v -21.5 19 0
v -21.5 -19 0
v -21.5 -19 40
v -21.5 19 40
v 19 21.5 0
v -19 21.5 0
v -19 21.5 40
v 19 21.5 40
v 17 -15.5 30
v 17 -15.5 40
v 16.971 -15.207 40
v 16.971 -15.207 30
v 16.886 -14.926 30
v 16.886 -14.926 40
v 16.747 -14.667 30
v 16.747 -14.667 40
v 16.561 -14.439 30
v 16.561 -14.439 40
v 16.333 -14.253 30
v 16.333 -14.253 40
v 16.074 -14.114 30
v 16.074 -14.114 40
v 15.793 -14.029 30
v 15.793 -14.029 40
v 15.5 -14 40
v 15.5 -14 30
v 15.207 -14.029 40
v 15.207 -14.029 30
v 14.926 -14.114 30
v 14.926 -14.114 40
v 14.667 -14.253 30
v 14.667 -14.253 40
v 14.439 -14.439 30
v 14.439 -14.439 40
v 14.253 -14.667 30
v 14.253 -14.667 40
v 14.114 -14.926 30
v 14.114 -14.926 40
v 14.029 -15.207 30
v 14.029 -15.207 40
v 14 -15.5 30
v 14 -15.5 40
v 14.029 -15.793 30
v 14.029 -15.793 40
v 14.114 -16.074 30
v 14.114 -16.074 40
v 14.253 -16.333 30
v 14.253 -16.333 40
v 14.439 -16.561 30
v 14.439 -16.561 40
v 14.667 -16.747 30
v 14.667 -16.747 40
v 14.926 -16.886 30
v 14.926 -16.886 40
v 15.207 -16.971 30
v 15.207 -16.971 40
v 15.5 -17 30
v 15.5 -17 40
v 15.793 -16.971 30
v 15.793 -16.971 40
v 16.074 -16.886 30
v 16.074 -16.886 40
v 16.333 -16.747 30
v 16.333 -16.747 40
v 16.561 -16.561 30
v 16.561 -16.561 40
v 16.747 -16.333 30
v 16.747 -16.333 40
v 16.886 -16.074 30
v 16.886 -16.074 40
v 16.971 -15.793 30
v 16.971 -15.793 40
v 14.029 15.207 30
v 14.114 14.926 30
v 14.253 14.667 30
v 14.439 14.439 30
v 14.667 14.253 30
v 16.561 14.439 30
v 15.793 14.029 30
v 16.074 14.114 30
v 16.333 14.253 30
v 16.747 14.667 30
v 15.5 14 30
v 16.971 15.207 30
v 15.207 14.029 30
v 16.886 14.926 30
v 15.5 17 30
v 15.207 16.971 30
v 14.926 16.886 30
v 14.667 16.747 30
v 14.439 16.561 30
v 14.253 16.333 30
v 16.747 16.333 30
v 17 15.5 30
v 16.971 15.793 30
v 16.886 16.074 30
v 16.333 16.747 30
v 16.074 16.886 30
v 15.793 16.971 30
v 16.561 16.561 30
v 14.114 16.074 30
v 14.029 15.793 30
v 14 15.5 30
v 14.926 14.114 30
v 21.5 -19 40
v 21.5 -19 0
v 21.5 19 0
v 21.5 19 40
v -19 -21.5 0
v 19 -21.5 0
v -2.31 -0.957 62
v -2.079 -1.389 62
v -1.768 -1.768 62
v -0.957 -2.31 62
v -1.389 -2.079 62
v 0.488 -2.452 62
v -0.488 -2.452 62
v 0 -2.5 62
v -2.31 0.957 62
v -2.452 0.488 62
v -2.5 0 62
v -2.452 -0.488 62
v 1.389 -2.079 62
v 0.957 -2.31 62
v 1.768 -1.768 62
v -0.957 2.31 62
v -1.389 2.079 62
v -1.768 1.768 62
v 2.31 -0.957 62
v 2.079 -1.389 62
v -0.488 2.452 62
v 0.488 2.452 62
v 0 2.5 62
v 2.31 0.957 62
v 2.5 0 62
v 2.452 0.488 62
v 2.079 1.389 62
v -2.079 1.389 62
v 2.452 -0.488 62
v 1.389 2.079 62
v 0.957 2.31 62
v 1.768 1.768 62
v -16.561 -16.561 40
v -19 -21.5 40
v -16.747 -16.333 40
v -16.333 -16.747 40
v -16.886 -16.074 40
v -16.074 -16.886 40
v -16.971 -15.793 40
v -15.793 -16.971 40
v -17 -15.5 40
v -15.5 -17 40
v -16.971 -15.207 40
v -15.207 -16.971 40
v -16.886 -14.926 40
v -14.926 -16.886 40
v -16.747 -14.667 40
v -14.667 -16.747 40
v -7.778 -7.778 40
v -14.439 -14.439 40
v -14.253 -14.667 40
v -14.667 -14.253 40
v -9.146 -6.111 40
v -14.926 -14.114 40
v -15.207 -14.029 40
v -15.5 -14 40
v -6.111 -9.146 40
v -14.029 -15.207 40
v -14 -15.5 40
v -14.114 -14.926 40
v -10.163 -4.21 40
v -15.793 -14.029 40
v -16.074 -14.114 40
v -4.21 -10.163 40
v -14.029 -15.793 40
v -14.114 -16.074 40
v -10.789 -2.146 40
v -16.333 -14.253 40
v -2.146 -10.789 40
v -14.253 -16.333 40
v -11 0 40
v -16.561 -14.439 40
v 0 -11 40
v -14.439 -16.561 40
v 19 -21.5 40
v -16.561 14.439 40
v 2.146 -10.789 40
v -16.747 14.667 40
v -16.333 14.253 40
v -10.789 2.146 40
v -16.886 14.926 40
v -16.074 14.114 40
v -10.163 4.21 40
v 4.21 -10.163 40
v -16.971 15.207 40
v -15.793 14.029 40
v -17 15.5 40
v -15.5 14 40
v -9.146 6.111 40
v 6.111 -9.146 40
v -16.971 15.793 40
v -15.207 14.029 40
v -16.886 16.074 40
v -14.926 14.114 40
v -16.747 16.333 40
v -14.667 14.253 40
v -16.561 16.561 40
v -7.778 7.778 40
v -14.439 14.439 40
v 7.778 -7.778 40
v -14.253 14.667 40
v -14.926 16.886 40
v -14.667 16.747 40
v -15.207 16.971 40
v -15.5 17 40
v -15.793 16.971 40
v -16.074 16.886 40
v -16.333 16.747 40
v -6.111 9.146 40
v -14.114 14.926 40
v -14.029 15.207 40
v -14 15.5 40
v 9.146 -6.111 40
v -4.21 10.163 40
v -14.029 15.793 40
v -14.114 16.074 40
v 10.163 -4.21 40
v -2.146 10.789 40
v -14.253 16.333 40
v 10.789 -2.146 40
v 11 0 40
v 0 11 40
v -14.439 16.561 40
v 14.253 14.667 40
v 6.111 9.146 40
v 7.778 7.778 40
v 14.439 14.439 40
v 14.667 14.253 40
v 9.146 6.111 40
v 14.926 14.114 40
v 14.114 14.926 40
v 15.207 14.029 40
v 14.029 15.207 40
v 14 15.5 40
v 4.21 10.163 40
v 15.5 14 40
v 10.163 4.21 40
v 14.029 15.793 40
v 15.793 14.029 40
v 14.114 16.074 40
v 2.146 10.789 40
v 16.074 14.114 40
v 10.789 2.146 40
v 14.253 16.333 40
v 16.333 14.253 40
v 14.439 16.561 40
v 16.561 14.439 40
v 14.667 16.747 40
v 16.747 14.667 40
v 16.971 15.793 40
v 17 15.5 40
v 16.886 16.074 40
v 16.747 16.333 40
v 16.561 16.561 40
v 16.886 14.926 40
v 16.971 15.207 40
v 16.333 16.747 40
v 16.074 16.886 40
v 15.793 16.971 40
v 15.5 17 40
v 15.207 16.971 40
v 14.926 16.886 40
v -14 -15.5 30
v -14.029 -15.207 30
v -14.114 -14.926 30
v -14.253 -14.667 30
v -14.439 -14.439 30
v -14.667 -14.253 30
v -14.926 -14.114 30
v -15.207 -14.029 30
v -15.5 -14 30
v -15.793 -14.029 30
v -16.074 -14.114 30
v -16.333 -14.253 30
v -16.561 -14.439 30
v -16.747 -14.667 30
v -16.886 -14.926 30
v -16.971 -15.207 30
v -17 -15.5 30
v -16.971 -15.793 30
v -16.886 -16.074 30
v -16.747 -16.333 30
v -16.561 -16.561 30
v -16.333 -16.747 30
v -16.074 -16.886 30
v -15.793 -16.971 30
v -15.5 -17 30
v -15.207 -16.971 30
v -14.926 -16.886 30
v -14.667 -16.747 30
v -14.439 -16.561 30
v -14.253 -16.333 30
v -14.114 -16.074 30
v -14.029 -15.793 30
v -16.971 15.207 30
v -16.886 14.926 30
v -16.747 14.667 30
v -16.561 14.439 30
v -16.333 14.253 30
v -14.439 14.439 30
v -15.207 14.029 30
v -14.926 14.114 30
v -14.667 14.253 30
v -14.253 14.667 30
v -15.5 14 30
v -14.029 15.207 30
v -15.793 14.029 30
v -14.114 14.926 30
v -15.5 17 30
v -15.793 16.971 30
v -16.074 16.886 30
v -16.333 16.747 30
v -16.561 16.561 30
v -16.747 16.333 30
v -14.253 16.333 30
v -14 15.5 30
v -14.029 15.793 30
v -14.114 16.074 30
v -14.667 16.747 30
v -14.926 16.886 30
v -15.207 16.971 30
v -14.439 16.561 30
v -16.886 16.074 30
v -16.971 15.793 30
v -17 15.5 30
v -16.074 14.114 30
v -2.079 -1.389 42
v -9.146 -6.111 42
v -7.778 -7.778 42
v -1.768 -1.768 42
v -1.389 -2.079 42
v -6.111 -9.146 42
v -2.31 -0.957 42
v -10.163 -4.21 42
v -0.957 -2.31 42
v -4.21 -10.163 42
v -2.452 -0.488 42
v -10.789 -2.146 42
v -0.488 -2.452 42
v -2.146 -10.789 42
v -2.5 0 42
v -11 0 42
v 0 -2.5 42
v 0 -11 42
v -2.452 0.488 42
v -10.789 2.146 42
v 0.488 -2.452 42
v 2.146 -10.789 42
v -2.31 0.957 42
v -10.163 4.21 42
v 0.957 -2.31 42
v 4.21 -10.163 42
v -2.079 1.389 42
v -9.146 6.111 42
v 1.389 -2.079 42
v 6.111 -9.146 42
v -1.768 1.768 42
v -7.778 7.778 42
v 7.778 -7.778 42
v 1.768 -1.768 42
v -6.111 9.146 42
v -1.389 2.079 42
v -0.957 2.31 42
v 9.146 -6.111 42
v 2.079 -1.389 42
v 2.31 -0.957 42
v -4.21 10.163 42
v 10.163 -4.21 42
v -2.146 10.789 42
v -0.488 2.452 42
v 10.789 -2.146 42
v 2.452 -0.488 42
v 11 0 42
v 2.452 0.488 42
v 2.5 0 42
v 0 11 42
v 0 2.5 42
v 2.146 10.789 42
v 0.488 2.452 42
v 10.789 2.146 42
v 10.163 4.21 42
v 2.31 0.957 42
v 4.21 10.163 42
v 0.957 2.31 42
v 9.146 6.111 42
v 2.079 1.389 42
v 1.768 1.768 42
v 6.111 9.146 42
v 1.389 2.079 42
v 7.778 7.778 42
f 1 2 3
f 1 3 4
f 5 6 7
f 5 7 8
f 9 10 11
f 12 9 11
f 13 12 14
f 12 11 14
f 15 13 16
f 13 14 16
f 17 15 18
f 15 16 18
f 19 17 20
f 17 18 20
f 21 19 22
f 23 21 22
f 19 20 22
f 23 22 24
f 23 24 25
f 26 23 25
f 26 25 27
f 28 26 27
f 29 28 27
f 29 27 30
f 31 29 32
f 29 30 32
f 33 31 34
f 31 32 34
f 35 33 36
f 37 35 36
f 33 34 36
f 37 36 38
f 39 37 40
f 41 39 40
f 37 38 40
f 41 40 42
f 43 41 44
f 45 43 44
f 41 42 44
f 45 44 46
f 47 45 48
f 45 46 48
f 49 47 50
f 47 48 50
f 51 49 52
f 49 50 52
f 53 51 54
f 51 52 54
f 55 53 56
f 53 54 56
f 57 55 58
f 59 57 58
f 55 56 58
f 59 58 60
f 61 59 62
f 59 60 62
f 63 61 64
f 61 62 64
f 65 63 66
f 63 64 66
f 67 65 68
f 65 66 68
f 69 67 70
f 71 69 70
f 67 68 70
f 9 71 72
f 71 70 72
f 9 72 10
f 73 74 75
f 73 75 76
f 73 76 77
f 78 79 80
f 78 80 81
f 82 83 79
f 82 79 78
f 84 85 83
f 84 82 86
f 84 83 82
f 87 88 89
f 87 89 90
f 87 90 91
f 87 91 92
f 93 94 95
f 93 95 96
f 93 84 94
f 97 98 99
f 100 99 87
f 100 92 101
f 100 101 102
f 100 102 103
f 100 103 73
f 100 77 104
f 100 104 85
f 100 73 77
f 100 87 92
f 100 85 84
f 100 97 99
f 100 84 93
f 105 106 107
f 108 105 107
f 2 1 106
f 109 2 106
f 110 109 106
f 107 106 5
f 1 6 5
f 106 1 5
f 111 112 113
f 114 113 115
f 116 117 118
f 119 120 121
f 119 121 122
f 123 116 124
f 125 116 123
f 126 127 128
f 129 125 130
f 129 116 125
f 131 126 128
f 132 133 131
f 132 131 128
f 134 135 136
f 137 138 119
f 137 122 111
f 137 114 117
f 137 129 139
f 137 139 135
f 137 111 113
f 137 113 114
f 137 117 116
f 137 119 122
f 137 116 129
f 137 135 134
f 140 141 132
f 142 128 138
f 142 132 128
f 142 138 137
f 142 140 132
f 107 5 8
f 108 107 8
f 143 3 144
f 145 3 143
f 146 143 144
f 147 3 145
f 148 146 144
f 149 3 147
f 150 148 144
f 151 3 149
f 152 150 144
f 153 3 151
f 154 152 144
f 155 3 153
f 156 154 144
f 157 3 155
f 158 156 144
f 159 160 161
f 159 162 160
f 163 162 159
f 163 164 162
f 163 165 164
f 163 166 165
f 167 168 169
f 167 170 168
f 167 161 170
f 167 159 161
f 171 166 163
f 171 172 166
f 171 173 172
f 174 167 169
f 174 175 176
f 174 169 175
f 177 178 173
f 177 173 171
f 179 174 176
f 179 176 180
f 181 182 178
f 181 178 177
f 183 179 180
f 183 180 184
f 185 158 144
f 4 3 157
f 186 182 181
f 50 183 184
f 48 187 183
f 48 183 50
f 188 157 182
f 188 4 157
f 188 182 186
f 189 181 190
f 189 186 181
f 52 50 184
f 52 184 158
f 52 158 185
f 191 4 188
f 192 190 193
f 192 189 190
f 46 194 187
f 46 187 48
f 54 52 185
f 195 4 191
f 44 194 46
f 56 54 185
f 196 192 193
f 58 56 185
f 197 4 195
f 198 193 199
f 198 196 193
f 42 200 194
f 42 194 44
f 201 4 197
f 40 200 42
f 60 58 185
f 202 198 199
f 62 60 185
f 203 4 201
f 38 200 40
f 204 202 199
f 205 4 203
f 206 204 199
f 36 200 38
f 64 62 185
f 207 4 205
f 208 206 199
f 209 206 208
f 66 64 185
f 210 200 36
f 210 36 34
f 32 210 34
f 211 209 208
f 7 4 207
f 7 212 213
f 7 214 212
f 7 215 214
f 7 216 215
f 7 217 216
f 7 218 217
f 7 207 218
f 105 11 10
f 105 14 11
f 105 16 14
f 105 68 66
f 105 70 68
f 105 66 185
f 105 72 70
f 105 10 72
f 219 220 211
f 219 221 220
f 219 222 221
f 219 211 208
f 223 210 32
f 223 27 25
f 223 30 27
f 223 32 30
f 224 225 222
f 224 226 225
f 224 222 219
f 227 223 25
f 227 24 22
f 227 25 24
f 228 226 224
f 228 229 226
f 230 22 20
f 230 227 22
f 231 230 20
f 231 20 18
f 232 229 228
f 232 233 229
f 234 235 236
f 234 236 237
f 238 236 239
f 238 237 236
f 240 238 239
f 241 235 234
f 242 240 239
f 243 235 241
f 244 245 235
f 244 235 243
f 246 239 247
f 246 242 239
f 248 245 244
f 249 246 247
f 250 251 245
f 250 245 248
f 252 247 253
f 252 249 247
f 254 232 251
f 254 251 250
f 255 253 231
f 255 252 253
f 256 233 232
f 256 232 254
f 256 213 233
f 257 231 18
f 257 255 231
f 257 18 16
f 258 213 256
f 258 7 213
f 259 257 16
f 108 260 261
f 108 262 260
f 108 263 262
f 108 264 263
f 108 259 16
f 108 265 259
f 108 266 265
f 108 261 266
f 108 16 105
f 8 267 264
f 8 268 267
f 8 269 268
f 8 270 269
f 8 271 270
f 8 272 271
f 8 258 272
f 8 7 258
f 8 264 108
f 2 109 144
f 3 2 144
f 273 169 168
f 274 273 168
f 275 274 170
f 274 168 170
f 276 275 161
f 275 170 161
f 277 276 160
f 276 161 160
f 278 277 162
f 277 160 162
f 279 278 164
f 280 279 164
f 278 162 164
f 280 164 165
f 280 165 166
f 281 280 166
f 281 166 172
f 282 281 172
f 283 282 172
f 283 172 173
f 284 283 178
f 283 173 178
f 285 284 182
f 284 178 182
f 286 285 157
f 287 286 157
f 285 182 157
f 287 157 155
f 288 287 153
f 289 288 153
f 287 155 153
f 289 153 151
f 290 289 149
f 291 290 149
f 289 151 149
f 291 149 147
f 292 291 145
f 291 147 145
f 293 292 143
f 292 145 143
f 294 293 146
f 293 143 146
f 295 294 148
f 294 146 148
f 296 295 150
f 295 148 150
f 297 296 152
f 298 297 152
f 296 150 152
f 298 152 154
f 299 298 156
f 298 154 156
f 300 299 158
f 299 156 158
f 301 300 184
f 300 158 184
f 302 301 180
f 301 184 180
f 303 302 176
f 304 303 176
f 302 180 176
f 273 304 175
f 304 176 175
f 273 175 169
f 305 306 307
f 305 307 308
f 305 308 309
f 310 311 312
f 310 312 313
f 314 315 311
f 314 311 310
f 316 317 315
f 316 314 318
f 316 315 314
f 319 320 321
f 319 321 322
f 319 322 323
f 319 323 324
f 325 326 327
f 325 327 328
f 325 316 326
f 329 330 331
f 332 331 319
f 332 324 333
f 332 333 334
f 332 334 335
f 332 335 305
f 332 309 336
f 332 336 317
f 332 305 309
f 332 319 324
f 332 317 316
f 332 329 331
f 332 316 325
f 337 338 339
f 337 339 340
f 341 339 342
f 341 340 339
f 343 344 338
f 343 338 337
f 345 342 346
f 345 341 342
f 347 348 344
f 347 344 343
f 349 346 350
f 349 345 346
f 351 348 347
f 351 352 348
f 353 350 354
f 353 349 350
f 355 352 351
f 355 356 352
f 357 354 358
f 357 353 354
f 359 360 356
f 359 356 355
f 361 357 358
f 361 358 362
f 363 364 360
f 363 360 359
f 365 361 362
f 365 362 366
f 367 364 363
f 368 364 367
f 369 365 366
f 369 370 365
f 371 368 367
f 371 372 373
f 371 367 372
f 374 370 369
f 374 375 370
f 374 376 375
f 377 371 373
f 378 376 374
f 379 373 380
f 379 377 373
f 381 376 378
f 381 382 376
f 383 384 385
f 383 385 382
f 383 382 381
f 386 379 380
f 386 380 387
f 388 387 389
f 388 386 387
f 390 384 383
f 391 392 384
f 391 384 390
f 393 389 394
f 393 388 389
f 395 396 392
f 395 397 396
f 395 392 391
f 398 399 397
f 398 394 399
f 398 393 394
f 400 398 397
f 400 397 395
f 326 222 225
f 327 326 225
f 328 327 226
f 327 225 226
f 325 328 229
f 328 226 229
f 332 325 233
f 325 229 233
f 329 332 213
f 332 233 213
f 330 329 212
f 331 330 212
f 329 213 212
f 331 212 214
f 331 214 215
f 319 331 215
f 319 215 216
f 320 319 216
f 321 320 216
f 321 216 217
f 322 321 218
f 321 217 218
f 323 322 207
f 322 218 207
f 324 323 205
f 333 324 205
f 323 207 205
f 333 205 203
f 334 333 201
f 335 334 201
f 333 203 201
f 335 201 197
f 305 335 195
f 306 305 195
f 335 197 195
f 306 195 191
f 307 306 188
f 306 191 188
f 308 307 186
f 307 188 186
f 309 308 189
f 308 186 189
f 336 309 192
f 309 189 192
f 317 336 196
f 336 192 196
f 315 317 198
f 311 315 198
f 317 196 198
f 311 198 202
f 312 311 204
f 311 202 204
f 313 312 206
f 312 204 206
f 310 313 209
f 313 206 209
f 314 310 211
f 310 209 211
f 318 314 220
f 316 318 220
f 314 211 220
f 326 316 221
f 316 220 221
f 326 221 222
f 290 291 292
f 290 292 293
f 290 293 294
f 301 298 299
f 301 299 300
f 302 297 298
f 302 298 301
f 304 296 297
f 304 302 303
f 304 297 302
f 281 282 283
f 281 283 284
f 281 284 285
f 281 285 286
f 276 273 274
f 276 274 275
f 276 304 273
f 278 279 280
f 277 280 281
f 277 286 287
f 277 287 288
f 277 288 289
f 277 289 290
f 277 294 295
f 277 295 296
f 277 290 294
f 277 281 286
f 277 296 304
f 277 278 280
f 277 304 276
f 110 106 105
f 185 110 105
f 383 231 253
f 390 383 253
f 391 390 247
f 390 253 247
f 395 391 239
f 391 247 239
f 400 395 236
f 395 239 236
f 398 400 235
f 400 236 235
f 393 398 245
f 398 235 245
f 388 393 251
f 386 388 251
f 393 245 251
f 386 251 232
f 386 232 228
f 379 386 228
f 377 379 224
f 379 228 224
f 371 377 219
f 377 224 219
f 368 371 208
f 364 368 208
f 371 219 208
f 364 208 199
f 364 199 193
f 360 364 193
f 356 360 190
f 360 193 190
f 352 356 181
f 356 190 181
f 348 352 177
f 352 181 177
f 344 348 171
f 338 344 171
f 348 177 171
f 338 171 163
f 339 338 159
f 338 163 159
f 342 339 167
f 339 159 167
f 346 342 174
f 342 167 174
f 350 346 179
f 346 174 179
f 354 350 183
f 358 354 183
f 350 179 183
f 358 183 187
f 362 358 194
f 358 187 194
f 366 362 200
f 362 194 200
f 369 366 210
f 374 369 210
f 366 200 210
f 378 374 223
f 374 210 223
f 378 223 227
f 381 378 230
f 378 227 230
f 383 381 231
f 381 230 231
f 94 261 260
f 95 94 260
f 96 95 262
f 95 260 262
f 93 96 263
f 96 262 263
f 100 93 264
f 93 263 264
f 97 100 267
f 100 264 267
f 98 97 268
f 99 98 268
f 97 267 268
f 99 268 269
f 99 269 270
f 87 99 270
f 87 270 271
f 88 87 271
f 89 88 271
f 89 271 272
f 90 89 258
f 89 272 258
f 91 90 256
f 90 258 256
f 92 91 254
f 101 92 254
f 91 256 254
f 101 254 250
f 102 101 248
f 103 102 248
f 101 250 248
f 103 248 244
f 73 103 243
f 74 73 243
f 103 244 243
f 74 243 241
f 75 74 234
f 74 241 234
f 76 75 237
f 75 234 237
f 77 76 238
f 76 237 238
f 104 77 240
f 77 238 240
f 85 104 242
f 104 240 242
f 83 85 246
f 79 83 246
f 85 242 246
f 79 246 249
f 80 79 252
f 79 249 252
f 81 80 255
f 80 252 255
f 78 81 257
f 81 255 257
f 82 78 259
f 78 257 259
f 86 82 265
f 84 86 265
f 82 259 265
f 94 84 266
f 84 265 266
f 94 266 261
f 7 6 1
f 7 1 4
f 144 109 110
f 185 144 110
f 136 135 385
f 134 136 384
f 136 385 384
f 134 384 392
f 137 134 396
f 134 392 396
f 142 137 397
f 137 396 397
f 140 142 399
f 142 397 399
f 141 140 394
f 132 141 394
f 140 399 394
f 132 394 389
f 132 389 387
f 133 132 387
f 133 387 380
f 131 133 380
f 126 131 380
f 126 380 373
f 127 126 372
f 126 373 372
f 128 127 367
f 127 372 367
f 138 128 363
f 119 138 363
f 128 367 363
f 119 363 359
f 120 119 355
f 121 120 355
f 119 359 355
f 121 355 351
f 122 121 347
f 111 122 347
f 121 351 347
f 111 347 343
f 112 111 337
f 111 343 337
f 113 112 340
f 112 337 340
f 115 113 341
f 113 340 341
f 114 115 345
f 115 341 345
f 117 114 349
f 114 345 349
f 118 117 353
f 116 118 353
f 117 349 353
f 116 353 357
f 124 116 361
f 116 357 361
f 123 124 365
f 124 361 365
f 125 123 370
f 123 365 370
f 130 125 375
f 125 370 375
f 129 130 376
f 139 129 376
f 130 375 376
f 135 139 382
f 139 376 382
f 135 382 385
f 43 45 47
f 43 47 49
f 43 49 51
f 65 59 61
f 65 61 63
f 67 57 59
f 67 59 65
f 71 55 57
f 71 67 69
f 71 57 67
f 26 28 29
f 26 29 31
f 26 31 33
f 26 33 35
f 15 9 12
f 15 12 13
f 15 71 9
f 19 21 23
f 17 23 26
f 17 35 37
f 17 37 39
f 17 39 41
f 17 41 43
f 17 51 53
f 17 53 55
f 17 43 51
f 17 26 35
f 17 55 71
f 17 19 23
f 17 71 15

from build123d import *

# Parameters (mm, degrees)
SKETCH1_W           = 43
SKETCH1_H           = 43
BOSS_EXTRUDE1_DEPTH = 40
CHAMFER1_SIZE       = 2.5
SKETCH2_R           = 11
BOSS_EXTRUDE2_DEPTH = 2
SKETCH3_R           = 2.5
BOSS_EXTRUDE3_DEPTH = 20
SKETCH4_R           = 1.5
CUT_EXTRUDE1_DEPTH  = 10


with BuildPart() as part:
    # Sketch1 → Boss-Extrude1 (new body)
    with BuildSketch(Plane.XY):
        Rectangle(SKETCH1_W, SKETCH1_H)
    extrude(amount=BOSS_EXTRUDE1_DEPTH)

    # Chamfer1
    chamfer1_edges = [part.edges().sort_by_distance(p)[0] for p in [
        (21.5, -21.5, 20),
        (-21.5, -21.5, 20),
        (-21.5, 21.5, 20),
        (21.5, 21.5, 20),
    ]]
    chamfer(chamfer1_edges, length=CHAMFER1_SIZE)

    # Sketch2 → Boss-Extrude2 (add)
    with BuildSketch(Plane.XY.offset(40)):
        Circle(SKETCH2_R)
    extrude(amount=BOSS_EXTRUDE2_DEPTH)

    # Sketch3 → Boss-Extrude3 (add)
    with BuildSketch(Plane.XY.offset(42)):
        Circle(SKETCH3_R)
    extrude(amount=BOSS_EXTRUDE3_DEPTH)

    # Sketch4 → Cut-Extrude1 (cut)
    with BuildSketch(Plane.XY.offset(40)):
        with Locations((-15.5, 15.5)):
            Circle(SKETCH4_R)
        with Locations((15.5, 15.5)):
            Circle(SKETCH4_R)
        with Locations((15.5, -15.5)):
            Circle(SKETCH4_R)
        with Locations((-15.5, -15.5)):
            Circle(SKETCH4_R)
    extrude(amount=-CUT_EXTRUDE1_DEPTH, mode=Mode.SUBTRACT)


solid = part.part
